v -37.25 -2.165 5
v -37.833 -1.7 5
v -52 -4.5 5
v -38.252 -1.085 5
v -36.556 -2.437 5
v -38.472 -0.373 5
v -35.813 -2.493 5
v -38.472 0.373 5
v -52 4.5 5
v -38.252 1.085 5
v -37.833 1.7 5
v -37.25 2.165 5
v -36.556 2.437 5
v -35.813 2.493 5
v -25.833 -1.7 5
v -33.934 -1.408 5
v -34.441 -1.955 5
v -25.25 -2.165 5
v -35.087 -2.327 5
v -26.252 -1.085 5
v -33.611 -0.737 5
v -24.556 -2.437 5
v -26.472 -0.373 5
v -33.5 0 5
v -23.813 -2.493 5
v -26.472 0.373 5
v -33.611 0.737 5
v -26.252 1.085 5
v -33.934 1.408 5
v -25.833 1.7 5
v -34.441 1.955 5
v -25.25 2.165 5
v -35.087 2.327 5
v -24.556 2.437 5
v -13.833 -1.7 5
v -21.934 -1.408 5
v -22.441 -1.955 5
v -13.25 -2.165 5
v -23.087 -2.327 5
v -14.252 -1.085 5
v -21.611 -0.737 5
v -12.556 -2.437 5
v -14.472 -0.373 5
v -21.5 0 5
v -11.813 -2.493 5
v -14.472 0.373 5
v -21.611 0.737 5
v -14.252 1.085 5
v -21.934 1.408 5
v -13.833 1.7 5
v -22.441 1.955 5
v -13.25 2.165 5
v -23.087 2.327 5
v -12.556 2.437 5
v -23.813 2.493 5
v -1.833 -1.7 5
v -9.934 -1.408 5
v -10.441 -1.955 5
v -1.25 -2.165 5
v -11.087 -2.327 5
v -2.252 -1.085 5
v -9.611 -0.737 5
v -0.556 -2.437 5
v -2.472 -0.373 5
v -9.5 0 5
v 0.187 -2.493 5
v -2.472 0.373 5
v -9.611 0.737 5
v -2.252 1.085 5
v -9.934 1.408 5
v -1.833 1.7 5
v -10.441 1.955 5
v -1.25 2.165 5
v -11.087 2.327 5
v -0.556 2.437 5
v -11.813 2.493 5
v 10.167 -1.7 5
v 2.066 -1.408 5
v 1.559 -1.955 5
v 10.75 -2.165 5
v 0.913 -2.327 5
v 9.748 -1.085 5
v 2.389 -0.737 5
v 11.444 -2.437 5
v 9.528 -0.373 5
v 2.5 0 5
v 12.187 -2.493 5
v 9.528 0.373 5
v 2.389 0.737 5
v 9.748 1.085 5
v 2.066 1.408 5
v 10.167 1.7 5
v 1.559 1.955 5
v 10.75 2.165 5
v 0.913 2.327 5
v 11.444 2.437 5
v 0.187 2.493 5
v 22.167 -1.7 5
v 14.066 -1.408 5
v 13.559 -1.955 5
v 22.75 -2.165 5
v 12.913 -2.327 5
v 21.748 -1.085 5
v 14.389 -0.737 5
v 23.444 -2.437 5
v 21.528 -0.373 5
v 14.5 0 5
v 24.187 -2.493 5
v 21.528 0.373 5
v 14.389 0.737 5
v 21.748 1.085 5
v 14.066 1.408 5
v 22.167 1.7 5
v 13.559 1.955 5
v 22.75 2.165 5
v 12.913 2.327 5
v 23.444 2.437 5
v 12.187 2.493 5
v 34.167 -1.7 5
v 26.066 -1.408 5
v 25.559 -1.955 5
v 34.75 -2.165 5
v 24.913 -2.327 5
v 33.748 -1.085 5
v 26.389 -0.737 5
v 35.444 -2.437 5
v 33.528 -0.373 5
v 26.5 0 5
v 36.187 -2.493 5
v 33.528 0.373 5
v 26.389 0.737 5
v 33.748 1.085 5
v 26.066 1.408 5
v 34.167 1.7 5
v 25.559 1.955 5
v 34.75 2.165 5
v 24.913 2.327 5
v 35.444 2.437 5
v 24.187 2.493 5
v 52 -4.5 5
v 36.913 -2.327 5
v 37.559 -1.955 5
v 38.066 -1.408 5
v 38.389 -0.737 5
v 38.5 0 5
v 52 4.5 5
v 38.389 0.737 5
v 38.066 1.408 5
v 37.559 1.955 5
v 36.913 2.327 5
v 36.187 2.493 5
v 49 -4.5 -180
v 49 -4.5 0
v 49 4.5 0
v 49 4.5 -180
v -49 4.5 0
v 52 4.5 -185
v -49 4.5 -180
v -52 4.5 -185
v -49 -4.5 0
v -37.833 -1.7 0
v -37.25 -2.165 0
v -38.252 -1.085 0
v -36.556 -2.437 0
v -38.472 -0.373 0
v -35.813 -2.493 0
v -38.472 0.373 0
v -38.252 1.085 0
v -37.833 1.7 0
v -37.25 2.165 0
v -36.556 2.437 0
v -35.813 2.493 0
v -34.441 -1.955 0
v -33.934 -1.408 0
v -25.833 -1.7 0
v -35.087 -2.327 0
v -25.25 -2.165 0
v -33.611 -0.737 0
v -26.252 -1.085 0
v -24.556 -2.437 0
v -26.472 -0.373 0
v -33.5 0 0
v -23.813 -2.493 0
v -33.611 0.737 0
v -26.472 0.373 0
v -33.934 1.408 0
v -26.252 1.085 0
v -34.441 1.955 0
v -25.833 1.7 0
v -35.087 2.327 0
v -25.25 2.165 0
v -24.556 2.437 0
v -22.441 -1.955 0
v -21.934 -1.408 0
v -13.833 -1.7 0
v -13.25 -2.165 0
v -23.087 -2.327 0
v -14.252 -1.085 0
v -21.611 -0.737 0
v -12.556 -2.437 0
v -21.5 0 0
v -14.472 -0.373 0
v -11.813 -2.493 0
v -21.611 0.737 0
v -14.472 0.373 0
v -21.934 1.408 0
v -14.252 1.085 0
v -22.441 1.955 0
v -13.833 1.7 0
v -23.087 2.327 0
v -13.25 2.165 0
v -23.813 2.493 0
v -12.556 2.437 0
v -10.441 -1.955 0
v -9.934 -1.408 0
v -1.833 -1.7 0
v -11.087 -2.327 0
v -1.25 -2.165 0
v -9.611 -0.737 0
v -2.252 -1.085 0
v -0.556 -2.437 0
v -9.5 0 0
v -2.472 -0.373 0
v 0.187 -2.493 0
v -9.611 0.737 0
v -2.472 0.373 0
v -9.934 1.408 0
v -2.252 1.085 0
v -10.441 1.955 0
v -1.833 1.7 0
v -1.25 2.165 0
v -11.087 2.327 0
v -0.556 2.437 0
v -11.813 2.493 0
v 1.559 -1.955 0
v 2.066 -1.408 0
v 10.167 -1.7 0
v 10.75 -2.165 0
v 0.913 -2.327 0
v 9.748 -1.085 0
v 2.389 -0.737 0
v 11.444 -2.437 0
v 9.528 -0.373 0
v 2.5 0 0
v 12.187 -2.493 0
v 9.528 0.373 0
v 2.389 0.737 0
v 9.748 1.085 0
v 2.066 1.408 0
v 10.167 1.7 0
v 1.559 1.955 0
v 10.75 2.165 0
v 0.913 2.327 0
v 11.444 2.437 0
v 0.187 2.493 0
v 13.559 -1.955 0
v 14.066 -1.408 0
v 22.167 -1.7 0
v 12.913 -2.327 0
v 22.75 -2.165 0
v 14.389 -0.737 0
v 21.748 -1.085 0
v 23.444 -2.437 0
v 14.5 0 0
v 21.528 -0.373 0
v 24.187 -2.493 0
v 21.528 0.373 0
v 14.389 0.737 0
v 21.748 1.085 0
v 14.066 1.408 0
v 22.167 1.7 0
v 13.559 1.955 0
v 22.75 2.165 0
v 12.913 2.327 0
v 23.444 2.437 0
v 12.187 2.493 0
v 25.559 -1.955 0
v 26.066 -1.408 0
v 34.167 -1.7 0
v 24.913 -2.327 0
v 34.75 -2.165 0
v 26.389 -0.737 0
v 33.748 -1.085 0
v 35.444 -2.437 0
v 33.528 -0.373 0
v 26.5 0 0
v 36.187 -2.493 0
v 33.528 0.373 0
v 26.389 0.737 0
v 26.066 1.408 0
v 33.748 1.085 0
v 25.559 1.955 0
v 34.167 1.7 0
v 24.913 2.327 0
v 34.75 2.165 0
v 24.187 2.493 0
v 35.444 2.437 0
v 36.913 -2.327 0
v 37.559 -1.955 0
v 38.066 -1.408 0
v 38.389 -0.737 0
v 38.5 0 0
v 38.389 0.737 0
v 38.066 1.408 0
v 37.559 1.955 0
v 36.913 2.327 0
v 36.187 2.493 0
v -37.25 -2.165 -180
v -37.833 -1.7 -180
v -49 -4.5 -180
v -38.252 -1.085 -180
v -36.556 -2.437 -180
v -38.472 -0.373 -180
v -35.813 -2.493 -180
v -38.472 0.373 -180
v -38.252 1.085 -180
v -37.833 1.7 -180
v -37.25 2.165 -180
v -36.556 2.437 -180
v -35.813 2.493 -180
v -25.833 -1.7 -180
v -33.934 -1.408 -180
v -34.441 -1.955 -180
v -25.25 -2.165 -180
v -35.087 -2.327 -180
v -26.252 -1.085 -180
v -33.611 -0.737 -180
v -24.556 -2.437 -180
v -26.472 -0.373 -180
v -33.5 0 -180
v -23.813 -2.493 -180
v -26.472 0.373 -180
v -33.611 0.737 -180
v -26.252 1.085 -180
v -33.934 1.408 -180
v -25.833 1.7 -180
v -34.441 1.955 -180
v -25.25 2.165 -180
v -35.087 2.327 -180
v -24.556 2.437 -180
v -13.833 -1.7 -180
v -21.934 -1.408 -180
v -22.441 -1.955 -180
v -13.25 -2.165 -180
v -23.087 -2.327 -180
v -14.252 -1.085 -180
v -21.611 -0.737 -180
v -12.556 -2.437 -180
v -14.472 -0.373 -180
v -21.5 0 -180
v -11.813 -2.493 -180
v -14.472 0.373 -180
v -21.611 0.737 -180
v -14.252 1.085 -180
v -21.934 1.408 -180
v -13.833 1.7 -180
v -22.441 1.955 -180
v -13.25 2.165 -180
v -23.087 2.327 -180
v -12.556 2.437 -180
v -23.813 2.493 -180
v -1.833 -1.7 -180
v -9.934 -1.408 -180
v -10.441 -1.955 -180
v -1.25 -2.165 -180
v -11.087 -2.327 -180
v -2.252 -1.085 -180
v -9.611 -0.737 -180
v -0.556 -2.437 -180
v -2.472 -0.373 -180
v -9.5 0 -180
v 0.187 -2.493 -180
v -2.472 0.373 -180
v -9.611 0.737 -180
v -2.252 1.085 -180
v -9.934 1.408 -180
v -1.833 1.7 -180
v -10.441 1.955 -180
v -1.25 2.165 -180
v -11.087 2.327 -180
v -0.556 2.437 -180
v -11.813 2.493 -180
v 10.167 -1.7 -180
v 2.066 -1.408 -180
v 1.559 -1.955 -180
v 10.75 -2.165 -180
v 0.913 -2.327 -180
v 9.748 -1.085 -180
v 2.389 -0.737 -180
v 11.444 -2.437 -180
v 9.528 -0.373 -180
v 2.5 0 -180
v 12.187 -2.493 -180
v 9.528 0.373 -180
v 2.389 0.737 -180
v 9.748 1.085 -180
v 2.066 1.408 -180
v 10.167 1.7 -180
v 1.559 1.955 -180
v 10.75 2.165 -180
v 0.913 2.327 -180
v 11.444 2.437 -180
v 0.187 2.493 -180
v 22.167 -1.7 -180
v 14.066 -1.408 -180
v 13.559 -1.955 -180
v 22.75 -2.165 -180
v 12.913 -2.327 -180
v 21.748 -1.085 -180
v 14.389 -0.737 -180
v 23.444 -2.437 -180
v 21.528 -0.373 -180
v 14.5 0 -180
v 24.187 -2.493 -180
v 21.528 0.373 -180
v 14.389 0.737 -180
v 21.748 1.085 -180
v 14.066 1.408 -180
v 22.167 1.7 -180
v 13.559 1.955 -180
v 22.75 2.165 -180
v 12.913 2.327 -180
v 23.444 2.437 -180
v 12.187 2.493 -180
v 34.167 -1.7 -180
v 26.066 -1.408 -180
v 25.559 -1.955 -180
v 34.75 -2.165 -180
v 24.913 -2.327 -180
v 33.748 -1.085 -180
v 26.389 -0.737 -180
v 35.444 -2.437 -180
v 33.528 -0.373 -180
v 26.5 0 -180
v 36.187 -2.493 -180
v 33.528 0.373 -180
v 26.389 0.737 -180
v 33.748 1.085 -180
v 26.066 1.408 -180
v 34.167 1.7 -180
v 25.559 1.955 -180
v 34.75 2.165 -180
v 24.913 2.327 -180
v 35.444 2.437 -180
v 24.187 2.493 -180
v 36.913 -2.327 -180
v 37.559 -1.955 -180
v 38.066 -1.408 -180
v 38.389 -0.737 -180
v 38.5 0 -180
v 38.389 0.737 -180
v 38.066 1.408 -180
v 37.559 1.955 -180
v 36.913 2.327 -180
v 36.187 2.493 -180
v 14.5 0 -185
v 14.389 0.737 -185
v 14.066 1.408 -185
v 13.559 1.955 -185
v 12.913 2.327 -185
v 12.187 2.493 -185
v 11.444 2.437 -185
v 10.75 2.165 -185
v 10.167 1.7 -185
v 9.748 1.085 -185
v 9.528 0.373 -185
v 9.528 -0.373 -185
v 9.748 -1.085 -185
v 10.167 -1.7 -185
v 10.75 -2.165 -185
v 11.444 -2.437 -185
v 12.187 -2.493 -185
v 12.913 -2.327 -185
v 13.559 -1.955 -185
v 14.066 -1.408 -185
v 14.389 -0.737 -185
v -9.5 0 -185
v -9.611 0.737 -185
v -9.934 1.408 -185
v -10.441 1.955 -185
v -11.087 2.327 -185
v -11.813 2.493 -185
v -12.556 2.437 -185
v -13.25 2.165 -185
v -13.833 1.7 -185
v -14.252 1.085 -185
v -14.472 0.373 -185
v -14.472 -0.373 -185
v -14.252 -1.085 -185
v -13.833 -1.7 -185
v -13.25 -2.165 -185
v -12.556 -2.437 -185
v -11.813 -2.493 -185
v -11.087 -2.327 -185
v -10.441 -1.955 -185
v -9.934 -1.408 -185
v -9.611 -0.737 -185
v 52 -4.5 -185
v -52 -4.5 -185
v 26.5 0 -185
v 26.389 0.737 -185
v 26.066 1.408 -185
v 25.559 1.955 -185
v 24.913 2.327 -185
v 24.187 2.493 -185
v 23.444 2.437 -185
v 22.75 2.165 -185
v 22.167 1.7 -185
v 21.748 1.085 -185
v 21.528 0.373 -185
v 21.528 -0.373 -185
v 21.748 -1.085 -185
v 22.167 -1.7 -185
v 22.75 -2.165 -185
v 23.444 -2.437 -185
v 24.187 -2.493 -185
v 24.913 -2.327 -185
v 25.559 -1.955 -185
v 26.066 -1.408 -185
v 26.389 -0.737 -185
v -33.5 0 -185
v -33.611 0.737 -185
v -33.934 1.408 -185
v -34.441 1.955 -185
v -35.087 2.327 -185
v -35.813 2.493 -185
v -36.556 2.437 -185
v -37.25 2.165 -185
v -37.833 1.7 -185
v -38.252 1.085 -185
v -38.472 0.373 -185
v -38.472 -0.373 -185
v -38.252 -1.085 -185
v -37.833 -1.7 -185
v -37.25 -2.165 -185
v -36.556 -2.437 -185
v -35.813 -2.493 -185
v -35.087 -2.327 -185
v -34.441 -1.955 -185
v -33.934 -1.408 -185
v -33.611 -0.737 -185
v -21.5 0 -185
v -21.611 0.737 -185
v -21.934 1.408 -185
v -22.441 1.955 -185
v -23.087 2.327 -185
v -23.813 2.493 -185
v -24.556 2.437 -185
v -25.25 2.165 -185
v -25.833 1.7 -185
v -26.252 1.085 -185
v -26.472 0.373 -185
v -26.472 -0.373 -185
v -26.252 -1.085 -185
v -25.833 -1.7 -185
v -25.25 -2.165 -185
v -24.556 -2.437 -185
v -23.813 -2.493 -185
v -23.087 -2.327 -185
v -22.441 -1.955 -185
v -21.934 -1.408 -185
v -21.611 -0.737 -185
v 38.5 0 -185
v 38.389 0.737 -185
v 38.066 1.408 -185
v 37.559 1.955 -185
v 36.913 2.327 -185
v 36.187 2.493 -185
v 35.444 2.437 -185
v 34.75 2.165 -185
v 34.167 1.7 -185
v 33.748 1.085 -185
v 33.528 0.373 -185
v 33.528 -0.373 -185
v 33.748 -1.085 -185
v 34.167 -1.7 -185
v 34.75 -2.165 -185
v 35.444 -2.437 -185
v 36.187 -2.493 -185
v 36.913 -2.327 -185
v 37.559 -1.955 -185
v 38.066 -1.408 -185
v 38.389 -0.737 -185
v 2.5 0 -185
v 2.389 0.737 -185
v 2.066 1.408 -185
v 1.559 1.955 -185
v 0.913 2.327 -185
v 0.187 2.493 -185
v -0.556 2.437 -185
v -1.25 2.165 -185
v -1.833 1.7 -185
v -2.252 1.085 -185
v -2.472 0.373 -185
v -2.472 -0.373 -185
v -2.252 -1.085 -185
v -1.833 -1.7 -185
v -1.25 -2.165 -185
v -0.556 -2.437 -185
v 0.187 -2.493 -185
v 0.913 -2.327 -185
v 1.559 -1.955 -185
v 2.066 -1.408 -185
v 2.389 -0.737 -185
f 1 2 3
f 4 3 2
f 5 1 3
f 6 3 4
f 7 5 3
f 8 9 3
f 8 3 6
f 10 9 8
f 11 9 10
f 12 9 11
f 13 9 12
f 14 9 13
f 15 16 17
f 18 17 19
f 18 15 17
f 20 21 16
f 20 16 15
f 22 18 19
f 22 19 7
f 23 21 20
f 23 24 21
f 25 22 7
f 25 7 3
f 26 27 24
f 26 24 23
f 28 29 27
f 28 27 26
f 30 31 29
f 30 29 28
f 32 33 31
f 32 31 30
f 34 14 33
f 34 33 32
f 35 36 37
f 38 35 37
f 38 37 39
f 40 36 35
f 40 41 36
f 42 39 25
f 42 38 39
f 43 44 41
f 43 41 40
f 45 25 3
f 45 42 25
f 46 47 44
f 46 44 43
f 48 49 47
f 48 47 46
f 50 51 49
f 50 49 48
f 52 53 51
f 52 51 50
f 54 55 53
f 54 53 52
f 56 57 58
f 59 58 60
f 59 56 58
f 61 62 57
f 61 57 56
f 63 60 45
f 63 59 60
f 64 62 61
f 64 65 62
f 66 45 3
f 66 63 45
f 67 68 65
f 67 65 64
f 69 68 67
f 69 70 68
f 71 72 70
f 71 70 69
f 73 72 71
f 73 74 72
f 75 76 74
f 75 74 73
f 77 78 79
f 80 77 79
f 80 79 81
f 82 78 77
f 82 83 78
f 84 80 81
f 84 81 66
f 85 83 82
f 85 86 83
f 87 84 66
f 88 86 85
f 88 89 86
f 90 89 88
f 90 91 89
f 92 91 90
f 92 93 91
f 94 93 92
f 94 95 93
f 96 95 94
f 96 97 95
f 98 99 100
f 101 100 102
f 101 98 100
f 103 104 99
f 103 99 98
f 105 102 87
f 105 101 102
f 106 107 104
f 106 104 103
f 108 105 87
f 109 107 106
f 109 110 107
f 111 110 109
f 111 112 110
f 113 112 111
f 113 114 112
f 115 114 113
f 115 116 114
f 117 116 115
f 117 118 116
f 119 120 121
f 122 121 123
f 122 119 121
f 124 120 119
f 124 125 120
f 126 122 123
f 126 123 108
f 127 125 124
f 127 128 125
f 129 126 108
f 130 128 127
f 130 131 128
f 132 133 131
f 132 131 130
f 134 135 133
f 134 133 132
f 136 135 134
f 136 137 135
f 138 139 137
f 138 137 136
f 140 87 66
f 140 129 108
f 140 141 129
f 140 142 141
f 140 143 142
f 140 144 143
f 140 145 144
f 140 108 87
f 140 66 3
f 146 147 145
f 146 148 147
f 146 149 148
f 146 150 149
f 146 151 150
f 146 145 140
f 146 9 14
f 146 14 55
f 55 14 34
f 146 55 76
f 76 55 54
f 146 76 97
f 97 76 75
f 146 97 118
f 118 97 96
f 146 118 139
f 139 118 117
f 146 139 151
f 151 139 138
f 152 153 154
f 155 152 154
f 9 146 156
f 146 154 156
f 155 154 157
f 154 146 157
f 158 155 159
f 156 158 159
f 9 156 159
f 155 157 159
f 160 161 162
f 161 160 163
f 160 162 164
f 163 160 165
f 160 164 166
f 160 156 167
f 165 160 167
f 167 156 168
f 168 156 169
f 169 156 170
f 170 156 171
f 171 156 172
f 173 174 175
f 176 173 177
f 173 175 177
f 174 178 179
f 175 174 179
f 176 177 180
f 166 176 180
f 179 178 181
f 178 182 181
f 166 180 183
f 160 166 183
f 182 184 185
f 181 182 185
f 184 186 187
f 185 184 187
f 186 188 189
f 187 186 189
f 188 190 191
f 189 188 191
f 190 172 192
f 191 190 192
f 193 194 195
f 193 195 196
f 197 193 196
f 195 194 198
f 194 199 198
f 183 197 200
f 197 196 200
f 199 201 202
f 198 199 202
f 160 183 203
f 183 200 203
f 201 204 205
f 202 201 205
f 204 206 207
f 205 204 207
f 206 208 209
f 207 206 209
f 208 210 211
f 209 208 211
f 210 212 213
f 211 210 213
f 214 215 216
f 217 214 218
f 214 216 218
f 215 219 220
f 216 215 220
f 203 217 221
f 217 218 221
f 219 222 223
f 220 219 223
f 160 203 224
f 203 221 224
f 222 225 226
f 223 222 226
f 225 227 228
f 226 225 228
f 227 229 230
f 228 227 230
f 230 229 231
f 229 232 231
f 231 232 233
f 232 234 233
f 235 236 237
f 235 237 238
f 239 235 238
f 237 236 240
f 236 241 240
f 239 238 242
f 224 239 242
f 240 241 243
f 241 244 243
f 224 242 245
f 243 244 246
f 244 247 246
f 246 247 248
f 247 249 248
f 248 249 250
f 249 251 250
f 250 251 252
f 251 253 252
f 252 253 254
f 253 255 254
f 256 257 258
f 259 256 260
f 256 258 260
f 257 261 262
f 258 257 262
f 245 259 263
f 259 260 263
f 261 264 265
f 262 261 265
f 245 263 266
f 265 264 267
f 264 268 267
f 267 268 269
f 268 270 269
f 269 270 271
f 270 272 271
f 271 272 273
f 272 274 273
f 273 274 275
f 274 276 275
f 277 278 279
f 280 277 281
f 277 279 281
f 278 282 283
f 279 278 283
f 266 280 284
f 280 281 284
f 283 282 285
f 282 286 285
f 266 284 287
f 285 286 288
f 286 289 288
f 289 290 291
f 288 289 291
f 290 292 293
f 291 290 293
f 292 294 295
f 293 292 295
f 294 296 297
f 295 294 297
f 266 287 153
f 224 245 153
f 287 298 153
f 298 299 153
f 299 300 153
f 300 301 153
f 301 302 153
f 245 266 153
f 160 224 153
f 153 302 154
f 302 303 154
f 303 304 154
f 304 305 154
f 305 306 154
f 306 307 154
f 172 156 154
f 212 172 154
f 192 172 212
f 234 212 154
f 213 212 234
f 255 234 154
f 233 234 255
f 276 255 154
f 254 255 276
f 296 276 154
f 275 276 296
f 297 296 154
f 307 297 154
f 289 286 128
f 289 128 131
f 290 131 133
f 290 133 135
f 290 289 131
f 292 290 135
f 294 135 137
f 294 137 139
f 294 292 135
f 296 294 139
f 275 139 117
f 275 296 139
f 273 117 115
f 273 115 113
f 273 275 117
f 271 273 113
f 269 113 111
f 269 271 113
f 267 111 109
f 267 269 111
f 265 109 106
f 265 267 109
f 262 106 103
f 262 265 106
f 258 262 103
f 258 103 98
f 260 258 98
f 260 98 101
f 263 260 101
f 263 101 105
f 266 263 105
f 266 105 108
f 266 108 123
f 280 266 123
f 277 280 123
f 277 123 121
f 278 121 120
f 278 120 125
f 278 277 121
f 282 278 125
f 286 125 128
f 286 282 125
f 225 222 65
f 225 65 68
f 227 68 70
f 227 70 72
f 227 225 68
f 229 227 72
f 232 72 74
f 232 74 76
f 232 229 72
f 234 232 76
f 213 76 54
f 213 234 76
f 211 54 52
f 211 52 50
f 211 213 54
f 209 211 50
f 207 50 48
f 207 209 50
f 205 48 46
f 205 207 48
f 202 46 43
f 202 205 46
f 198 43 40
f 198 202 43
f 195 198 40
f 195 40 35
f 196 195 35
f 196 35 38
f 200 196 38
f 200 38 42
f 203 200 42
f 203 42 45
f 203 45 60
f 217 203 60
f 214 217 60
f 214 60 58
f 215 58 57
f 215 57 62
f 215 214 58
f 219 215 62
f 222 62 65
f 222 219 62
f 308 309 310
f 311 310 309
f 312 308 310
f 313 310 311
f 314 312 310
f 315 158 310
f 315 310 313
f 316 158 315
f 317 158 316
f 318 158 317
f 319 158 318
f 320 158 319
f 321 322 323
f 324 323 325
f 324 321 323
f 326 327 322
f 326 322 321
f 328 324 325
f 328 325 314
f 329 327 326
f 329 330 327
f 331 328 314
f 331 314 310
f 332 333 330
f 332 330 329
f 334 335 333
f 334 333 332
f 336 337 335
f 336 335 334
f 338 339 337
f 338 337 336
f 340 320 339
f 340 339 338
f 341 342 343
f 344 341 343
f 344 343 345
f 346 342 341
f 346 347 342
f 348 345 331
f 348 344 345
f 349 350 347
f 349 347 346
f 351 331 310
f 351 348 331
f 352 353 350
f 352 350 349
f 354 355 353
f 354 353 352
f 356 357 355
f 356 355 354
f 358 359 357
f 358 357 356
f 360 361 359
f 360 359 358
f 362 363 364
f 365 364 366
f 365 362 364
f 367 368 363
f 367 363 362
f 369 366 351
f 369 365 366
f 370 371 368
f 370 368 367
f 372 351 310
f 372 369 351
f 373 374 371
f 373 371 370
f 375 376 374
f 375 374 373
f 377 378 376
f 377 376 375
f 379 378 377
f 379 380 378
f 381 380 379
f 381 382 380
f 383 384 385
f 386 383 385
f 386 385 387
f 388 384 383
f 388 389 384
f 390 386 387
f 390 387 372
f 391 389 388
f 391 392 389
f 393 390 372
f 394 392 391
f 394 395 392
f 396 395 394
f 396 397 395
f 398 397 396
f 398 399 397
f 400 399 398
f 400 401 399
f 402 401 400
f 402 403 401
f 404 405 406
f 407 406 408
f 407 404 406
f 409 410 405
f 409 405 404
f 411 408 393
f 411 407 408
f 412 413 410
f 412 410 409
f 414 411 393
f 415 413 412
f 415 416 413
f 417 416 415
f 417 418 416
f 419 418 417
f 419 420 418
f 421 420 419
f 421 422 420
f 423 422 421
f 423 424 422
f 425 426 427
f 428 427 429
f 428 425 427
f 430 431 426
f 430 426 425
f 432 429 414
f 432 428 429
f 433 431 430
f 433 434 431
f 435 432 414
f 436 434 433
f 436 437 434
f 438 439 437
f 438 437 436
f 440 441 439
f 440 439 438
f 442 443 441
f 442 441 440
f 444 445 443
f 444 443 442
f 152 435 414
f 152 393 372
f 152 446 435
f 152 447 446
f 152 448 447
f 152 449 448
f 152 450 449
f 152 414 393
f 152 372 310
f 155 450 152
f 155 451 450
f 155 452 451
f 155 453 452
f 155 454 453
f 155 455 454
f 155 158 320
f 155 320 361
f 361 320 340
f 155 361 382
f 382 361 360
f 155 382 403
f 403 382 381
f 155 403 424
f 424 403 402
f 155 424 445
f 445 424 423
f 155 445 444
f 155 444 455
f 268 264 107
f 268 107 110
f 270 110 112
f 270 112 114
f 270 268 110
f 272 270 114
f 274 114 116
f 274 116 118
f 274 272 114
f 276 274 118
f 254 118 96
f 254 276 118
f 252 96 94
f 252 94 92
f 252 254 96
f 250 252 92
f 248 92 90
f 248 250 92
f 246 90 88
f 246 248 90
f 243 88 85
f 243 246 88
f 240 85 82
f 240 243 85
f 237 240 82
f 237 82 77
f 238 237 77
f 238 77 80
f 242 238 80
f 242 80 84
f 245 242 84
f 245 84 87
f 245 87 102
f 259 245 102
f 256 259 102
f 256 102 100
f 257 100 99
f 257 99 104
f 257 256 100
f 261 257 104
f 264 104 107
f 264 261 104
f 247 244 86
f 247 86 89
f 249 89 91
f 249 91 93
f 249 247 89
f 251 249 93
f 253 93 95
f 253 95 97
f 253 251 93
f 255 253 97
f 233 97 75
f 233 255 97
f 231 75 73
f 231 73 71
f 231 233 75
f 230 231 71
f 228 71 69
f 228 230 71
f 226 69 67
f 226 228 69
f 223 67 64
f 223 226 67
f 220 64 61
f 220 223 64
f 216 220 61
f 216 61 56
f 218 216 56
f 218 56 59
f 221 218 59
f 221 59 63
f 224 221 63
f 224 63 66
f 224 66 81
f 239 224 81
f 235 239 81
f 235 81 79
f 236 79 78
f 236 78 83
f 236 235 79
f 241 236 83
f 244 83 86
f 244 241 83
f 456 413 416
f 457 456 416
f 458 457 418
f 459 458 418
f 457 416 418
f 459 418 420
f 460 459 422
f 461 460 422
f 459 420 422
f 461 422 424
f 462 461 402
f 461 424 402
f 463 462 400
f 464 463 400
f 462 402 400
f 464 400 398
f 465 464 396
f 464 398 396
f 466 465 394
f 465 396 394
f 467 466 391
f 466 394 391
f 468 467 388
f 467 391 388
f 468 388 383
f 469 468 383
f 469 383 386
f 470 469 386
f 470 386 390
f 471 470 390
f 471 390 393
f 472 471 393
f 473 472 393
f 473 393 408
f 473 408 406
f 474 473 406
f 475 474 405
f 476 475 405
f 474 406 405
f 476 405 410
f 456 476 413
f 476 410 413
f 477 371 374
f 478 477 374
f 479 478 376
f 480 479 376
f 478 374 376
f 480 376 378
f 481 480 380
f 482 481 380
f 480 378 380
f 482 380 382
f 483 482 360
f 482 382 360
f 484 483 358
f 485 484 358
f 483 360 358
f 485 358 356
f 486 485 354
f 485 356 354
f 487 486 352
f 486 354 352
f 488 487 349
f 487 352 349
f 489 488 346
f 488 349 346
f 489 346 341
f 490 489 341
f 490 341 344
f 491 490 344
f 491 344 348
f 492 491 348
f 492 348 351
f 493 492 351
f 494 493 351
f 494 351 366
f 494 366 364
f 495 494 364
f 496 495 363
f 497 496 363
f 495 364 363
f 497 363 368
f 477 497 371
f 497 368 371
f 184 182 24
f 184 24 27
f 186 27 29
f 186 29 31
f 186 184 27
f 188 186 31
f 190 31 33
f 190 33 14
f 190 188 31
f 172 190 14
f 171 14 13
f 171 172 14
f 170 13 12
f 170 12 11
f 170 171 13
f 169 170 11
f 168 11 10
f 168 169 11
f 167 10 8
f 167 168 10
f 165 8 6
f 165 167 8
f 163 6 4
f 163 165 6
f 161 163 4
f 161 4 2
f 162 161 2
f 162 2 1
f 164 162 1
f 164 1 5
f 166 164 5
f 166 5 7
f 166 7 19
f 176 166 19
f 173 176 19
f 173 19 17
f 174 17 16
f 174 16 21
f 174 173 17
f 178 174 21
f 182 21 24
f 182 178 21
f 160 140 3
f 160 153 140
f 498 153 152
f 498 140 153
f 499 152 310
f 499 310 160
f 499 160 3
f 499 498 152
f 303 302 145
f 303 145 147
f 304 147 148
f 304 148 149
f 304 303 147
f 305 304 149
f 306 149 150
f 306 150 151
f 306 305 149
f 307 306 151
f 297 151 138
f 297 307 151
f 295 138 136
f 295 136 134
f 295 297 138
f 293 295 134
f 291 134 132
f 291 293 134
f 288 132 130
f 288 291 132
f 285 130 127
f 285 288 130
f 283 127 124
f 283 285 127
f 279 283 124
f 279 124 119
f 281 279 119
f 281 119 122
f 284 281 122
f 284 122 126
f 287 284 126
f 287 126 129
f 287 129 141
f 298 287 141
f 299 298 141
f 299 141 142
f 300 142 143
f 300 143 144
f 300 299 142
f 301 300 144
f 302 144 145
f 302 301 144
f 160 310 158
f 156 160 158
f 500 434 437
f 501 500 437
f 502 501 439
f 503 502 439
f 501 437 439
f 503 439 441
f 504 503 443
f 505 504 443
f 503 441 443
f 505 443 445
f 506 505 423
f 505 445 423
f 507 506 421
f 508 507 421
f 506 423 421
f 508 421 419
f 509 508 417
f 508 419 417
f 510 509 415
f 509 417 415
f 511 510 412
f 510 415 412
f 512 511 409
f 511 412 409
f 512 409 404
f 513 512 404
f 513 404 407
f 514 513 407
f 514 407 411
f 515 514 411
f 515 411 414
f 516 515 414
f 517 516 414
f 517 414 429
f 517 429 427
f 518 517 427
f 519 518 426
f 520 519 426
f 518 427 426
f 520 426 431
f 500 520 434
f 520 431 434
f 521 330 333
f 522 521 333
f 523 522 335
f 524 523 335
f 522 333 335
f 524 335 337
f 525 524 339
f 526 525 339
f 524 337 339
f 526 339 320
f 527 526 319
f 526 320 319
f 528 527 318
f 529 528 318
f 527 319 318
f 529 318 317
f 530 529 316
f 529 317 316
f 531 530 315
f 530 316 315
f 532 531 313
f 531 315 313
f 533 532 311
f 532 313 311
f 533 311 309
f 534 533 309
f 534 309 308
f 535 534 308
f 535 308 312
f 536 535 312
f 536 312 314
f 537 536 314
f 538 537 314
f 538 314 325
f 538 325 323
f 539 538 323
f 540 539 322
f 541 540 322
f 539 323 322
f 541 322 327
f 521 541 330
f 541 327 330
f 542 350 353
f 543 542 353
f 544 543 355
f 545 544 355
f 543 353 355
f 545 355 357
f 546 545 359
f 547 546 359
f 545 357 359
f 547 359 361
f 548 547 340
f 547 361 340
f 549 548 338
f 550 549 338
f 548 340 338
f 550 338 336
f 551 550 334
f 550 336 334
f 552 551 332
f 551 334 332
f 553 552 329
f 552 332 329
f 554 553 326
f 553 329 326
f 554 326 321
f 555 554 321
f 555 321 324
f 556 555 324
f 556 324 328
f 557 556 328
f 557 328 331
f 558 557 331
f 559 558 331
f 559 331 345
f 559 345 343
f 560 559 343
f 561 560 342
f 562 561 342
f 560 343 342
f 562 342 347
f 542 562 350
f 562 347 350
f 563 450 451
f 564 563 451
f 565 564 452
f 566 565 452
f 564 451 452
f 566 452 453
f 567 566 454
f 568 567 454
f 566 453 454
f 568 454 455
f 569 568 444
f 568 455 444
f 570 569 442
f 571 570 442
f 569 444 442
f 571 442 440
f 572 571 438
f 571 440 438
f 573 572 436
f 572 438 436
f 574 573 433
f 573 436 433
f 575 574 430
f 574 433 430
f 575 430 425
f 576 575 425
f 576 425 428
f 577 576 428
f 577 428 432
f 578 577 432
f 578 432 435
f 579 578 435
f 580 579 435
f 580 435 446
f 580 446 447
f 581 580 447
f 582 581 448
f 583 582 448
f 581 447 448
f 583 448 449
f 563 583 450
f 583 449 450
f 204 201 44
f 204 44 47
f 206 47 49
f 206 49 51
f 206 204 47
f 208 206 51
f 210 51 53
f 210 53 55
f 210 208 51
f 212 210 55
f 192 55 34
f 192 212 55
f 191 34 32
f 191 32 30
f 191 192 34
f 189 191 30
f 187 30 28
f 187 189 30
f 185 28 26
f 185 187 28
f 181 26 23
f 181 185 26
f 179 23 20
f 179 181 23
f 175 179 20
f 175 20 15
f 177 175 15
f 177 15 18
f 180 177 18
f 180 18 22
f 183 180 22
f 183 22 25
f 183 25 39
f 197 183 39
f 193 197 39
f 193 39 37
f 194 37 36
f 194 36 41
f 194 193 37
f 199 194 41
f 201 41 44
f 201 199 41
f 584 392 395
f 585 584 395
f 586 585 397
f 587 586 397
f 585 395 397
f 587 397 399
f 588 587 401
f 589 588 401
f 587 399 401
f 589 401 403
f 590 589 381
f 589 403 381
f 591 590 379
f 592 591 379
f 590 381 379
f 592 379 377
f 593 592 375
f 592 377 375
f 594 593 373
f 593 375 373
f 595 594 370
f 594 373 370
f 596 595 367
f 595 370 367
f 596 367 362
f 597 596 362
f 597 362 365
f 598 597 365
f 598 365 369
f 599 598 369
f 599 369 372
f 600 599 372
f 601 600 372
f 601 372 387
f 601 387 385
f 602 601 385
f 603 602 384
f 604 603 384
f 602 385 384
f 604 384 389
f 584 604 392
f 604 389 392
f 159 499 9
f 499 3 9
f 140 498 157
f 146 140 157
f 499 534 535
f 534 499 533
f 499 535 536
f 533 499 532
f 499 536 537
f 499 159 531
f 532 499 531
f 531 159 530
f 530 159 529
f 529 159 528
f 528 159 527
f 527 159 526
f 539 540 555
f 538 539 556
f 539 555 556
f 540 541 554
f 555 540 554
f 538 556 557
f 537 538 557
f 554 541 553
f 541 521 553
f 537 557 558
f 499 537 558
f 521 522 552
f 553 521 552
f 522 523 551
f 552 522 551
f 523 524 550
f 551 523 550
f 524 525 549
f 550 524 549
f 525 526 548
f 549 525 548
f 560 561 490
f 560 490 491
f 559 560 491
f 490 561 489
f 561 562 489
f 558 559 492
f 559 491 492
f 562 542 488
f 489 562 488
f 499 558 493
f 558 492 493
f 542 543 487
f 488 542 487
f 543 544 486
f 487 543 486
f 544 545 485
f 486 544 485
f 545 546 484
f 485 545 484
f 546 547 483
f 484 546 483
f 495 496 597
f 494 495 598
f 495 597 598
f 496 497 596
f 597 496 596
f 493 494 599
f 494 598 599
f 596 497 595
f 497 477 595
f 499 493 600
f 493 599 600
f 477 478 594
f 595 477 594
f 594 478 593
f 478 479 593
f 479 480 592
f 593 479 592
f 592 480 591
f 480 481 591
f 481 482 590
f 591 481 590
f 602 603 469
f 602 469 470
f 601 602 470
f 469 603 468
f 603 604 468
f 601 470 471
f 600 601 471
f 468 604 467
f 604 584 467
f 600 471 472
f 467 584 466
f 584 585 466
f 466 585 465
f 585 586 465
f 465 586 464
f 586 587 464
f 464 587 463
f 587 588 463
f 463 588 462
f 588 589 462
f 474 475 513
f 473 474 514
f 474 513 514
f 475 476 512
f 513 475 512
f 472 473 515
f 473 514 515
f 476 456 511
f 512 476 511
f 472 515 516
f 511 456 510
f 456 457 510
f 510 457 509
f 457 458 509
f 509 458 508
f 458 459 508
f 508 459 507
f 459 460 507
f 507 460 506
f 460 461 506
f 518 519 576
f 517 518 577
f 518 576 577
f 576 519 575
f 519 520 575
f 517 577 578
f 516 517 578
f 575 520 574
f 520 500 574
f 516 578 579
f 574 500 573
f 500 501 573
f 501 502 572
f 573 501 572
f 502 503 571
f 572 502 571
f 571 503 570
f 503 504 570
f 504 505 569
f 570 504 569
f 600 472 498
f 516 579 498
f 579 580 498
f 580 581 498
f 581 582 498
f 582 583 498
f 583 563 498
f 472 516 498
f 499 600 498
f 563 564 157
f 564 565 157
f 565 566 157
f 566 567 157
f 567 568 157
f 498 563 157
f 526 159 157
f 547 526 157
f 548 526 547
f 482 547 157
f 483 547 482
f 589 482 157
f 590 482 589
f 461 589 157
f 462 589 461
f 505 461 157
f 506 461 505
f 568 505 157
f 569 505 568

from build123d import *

# Parameters (mm, degrees)
SKETCH_1_W      = 104
SKETCH_1_H      = 9
SKETCH_1_R      = 2.5
EXTRUDE_1_DEPTH = 5
SKETCH_2_W      = 3
SKETCH_2_H      = 9
EXTRUDE_2_DEPTH = 90


with BuildPart() as part:
    # 草圖1 → 填料-伸長1 (new body)
    with BuildSketch(Plane.XY):
        Rectangle(SKETCH_1_W, SKETCH_1_H)
        with Locations((-36, 0)):
            Circle(SKETCH_1_R, mode=Mode.SUBTRACT)
        with Locations((-24, 0)):
            Circle(SKETCH_1_R, mode=Mode.SUBTRACT)
        with Locations((-12, 0)):
            Circle(SKETCH_1_R, mode=Mode.SUBTRACT)
        Circle(SKETCH_1_R, mode=Mode.SUBTRACT)
        with Locations((12, 0)):
            Circle(SKETCH_1_R, mode=Mode.SUBTRACT)
        with Locations((24, 0)):
            Circle(SKETCH_1_R, mode=Mode.SUBTRACT)
        with Locations((36, 0)):
            Circle(SKETCH_1_R, mode=Mode.SUBTRACT)
    extrude_1 = extrude(amount=EXTRUDE_1_DEPTH)

    # 草圖2 → 填料-伸長2 (add)
    with BuildSketch(Plane(origin=(0, 0, 0), x_dir=(-1, 0, 0), z_dir=(0, 0, -1))):
        with Locations((-50.5, 0)):
            Rectangle(SKETCH_2_W, SKETCH_2_H)
        with Locations((50.5, 0)):
            Rectangle(SKETCH_2_W, SKETCH_2_H)
    extrude_2 = extrude(amount=EXTRUDE_2_DEPTH)

    # 鏡射4: 填料-伸長1, 填料-伸長2 across plane
    add(extrude_1.mirror(Plane(origin=(0, 0, -90), x_dir=(1, 0, 0), z_dir=(0, 0, -1))))
    add(extrude_2.mirror(Plane(origin=(0, 0, -90), x_dir=(1, 0, 0), z_dir=(0, 0, -1))))


solid = part.part
